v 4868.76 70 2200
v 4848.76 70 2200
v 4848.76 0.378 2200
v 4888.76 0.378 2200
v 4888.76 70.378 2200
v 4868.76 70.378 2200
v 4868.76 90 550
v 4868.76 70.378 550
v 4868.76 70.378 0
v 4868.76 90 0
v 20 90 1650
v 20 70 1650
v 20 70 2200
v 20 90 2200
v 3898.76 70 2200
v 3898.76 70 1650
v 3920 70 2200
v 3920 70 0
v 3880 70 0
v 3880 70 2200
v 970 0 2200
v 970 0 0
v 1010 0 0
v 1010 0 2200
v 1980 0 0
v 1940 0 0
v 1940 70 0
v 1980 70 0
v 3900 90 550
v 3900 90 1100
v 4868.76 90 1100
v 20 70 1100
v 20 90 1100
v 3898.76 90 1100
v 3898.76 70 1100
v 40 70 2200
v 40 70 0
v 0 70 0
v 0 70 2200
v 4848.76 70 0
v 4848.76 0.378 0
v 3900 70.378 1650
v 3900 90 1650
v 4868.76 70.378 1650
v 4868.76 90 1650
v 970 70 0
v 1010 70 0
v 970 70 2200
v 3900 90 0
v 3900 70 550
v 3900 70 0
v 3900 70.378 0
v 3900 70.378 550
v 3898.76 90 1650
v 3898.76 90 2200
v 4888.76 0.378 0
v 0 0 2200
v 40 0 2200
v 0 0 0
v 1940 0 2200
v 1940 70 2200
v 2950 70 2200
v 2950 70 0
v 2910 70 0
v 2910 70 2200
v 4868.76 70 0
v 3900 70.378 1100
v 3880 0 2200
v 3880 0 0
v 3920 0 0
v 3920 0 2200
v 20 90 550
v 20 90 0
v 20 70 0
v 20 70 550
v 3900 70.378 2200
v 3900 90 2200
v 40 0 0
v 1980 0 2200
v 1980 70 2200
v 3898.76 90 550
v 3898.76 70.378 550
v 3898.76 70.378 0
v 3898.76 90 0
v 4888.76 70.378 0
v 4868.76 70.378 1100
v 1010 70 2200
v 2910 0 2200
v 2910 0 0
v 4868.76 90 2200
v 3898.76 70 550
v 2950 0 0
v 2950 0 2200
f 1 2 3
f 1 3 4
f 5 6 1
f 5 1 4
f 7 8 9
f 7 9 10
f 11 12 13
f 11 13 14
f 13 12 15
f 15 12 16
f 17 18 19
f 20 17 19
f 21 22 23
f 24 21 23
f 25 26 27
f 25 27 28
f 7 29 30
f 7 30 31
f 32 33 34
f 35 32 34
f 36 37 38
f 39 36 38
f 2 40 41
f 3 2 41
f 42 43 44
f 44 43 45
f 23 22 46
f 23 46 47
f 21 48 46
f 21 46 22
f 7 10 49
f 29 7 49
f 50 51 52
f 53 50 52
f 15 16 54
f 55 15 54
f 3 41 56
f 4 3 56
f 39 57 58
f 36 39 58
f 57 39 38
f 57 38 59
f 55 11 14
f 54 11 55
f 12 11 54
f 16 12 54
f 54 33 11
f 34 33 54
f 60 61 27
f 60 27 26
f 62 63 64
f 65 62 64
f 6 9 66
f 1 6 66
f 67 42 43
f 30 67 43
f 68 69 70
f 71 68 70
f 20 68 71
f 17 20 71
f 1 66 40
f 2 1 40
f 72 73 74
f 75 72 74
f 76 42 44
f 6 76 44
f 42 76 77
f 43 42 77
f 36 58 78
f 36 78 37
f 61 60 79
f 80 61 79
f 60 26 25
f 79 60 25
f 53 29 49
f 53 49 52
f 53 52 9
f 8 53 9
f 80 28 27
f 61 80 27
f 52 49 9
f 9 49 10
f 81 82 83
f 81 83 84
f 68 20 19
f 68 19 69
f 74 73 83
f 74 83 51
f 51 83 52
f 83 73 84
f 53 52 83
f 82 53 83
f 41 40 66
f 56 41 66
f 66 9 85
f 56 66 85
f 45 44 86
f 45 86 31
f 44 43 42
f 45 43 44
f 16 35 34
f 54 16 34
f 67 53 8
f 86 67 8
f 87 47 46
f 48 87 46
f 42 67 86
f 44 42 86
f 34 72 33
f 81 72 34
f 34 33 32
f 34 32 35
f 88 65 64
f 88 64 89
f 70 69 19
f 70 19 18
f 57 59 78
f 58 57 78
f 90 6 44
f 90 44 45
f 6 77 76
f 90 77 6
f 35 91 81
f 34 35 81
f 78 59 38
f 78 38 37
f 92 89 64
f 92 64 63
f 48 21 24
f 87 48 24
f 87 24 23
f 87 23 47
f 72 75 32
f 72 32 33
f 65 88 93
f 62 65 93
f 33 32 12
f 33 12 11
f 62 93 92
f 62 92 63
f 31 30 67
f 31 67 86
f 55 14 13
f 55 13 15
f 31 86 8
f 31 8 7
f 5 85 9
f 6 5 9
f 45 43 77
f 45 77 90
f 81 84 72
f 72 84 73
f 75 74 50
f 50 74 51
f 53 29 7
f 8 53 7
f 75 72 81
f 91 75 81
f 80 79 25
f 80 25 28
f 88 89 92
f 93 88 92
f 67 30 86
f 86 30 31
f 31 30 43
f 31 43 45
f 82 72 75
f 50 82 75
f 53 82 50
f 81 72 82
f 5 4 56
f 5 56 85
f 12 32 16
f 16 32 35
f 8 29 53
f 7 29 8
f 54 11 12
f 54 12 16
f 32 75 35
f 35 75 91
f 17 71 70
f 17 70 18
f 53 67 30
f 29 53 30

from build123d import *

# Parameters (mm, degrees)
F1_DEPTH  = 2200
F2_DEPTH  = 550
F3_W      = 3878.76008
F3_H      = 20
F2_FACE_W = 968.760081
F2_FACE_H = 19.621525
F4_DEPTH  = 550
F5_W      = 3878.76008
F5_H      = 20
F4_FACE_W = 968.76008
F4_FACE_H = 19.621525
F6_DEPTH  = 550
F7_W      = 3878.76008
F7_H      = 20
F6_FACE_W = 968.76008
F6_FACE_H = 19.621525
F8_DEPTH  = 550


with BuildPart() as f1:
    # F0 (on Top) → F1 (new body)
    with BuildSketch(Plane.XY):
        Polygon((0, 70), (0, 0), (40, 0), (40, 70), (20, 70), align=None)
        Polygon((990, 70), (970, 70), (970, 0), (1010, 0), (1010, 70), align=None)
        Polygon((1960, 70), (1940, 70), (1940, 0), (1980, 0), (1980, 70), align=None)
        Polygon((2950, 70), (2930, 70), (2910, 70), (2910, 0), (2950, 0), align=None)
        Polygon((3900, 70), (3880, 70), (3880, 0), (3920, 0), (3920, 70), align=None)
        Polygon((4888.76008, 70.378475), (4868.76008, 70.378475), (4868.76008, 70), (4848.76008, 70), (4848.76008, 0.378475), (4888.76008, 0.378475), align=None)
    extrude(amount=F1_DEPTH)


with BuildPart() as f2:
    # F0 (on Top) → F2 (new body)
    with BuildSketch(Plane.XY):
        Polygon((20, 70), (40, 70), (970, 70), (990, 70), (990, 90), (20, 90), align=None)
        Polygon((990, 90), (990, 70), (1010, 70), (1940, 70), (1960, 70), (1960, 90), align=None)
        Polygon((2930, 90), (1960, 90), (1960, 70), (1980, 70), (2910, 70), (2930, 70), align=None)
        Polygon((3898.76008, 90), (2930, 90), (2930, 70), (2950, 70), (3880, 70), (3900, 70), (3900, 70.378475), (3898.76008, 70.378475), align=None)
        Polygon((4868.76008, 90), (3900, 90), (3900, 70.378475), (4848.76008, 70.378475), (4868.76008, 70.378475), align=None)
    extrude(amount=F2_DEPTH)


with BuildPart() as f4:
    # F3 (on face) + F2_face (on face) → F4 (new body)
    with BuildSketch(Plane.XY.offset(550)):
        with Locations((1959.38004, 80)):
            Rectangle(F3_W, F3_H)
    with BuildSketch(Plane(origin=(1959.391776, 79.999941, 550), x_dir=(1, 0, 0), z_dir=(0, 0, 1))):
        with Locations((2424.988264, 0.189297)):
            Rectangle(F2_FACE_W, F2_FACE_H)
    extrude(amount=F4_DEPTH)


with BuildPart() as f6:
    # F5 (on face) + F4_face (on face) → F6 (new body)
    with BuildSketch(Plane.XY.offset(1100)):
        with Locations((1959.38004, 80)):
            Rectangle(F5_W, F5_H)
    with BuildSketch(Plane(origin=(1959.38004, 80, 1100), x_dir=(1, 0, 0), z_dir=(0, 0, 1))):
        with Locations((2425, 0.189237)):
            Rectangle(F4_FACE_W, F4_FACE_H)
    extrude(amount=F6_DEPTH)


with BuildPart() as f8:
    # F7 (on face) + F6_face (on face) → F8 (new body)
    with BuildSketch(Plane.XY.offset(1650)):
        with Locations((1959.38004, 80)):
            Rectangle(F7_W, F7_H)
    with BuildSketch(Plane(origin=(1959.38004, 80, 1650), x_dir=(1, 0, 0), z_dir=(0, 0, 1))):
        with Locations((2425, 0.189237)):
            Rectangle(F6_FACE_W, F6_FACE_H)
    extrude(amount=F8_DEPTH)


solid = Compound([f1.part, f2.part, f4.part, f6.part, f8.part])
